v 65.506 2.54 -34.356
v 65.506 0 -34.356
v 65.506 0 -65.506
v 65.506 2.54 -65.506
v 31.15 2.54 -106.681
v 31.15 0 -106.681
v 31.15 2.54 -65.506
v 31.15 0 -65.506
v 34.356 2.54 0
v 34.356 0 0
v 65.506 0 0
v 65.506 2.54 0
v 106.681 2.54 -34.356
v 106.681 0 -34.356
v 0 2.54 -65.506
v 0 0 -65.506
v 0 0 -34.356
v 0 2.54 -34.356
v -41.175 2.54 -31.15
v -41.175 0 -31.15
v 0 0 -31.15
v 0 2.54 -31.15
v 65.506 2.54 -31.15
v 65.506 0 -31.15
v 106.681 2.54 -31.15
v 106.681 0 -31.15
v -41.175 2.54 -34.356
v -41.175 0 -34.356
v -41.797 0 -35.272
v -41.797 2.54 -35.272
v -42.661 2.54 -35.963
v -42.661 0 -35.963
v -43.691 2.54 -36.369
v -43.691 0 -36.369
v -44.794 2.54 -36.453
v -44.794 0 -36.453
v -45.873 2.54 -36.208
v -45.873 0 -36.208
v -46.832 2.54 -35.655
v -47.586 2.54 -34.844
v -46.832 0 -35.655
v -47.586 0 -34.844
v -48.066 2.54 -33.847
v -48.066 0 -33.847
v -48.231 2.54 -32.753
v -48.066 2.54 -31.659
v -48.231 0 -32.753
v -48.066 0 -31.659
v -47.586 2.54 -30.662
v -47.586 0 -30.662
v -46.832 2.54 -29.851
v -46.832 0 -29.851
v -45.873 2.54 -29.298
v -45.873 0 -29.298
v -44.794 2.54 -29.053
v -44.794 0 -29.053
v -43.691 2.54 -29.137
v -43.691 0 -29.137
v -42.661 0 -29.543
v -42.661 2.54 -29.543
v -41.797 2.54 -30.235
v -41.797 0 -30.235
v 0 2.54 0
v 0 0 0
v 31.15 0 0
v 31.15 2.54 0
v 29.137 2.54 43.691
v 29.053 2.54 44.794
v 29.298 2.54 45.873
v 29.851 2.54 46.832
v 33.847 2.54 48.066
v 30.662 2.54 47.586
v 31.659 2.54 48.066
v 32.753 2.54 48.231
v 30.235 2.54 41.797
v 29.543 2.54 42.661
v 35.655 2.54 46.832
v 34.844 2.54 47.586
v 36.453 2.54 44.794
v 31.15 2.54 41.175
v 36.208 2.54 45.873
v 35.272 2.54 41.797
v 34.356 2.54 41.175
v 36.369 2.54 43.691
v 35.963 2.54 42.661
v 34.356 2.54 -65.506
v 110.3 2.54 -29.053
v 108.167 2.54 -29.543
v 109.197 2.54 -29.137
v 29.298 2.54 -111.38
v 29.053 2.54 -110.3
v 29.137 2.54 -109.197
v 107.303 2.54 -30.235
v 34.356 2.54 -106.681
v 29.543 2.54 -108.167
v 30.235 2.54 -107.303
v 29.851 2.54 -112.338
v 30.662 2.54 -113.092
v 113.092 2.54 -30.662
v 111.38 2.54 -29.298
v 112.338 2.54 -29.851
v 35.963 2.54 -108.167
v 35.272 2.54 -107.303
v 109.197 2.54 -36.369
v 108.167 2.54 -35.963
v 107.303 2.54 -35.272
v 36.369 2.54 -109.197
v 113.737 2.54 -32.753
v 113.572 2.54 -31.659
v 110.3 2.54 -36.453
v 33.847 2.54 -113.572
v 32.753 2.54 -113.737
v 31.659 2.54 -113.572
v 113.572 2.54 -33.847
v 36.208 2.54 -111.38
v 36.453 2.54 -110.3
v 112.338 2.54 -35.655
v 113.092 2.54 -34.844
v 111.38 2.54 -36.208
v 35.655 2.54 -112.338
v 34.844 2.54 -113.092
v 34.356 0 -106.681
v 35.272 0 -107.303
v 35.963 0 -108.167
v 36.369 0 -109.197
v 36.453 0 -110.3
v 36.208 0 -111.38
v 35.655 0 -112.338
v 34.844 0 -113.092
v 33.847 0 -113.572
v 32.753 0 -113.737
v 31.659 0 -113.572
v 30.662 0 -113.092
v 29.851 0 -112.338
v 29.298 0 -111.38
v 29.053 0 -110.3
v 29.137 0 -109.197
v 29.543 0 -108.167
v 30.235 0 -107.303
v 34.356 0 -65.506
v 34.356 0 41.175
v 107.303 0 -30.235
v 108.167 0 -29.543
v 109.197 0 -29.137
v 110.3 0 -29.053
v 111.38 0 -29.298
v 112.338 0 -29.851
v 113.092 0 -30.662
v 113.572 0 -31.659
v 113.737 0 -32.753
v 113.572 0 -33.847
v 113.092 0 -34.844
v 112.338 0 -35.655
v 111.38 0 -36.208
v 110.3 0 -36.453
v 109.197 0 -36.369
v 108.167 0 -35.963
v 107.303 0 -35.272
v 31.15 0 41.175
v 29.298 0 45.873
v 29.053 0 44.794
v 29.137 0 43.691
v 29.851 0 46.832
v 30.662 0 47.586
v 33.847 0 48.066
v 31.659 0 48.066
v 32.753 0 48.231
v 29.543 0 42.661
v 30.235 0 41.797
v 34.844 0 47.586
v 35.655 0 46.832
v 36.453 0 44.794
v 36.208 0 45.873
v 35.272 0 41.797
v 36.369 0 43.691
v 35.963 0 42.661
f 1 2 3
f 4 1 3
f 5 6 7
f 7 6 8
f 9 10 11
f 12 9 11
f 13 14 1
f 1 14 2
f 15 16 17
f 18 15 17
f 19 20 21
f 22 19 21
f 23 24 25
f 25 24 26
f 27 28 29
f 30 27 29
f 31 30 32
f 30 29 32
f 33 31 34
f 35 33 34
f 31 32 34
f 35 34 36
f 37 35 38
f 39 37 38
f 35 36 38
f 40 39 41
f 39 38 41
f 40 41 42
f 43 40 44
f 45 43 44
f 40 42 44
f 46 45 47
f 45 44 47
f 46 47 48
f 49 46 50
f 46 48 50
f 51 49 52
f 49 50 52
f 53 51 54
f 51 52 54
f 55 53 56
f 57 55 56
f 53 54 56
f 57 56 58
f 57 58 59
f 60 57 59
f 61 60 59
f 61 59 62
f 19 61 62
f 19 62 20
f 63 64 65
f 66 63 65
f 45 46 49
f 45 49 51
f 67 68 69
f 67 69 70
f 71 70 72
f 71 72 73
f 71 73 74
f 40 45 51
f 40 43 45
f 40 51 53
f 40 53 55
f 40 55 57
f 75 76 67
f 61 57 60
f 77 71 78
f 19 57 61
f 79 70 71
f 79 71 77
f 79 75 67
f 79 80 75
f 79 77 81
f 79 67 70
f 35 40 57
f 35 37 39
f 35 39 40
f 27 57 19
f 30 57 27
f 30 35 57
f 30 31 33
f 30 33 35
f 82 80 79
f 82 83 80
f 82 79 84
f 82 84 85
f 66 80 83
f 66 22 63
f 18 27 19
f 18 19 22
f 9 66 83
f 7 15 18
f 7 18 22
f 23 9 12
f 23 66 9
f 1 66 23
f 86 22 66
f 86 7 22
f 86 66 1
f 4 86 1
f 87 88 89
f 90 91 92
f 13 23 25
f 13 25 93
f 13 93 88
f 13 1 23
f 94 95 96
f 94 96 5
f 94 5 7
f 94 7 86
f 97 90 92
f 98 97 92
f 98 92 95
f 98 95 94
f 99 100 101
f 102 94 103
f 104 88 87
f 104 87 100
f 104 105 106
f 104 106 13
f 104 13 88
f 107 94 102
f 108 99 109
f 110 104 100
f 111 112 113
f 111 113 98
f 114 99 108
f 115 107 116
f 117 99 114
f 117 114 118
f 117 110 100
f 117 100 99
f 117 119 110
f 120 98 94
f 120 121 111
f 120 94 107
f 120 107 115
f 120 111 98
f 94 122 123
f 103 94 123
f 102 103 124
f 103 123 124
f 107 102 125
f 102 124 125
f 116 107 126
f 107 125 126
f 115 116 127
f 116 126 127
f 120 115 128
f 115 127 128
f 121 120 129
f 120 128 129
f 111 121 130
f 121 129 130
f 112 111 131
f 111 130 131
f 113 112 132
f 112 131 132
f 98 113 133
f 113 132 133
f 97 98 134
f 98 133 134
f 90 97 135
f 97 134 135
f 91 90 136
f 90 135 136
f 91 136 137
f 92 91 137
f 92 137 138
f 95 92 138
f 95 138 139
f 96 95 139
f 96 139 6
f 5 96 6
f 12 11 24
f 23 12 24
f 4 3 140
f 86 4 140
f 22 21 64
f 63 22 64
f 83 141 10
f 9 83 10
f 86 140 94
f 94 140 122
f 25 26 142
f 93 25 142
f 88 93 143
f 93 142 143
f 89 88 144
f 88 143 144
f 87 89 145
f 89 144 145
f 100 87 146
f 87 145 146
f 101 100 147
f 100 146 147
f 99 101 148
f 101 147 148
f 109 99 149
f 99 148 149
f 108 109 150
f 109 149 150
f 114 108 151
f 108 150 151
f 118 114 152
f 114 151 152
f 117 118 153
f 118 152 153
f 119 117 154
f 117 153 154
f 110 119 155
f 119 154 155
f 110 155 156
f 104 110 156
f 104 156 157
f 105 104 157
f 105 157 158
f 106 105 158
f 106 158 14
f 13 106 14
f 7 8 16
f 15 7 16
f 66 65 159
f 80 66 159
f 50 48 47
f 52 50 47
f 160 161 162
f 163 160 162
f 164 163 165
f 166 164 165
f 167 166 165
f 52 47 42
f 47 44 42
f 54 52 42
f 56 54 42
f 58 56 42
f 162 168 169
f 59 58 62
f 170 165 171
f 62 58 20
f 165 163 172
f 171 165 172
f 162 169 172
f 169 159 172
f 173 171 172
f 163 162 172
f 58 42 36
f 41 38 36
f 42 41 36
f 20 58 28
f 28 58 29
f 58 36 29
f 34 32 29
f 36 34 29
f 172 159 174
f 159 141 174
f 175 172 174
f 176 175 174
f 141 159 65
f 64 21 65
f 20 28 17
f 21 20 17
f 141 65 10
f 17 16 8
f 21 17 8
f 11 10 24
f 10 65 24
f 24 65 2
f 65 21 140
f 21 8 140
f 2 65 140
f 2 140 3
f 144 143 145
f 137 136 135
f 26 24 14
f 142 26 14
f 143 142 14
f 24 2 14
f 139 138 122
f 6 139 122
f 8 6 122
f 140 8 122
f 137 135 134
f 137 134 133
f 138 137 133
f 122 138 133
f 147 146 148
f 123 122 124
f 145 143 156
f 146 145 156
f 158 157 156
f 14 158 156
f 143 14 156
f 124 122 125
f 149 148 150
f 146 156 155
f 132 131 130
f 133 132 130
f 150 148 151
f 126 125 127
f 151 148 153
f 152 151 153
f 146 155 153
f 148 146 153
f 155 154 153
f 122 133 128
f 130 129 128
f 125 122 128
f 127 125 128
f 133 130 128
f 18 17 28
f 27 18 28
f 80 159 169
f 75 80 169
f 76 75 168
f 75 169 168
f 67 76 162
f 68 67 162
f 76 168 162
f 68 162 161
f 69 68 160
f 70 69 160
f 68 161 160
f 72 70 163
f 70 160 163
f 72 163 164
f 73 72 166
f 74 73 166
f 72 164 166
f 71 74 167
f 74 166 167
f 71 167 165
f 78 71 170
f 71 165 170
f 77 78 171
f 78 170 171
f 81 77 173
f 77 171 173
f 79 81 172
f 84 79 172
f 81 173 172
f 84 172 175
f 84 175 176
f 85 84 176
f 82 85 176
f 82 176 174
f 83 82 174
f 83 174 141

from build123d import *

# Parameters (mm, degrees)
BOSS_EXTRUDE1_DEPTH = 2.54


with BuildPart() as part:
    # Sketch1 → Boss-Extrude1 (new body)
    with BuildSketch(Plane(origin=(0, 0, 0), x_dir=(1, 0, 0), z_dir=(0, 1, 0))):
        with BuildLine():
            Line((34.356030095, 0), (65.506126721, 0))
            Line((65.506126721, 0), (65.506126721, 31.150096626))
            Line((65.506126721, 31.150096626), (106.681389714, 31.150096626))
            ThreePointArc((106.681389714, 31.150096626), (113.737222592, 32.753063361), (106.681389714, 34.356030095))
            Line((106.681389714, 34.356030095), (65.506126721, 34.356030095))
            Line((65.506126721, 34.356030095), (65.506126721, 65.506126721))
            Line((65.506126721, 65.506126721), (34.356030095, 65.506126721))
            Line((34.356030095, 65.506126721), (34.356030095, 106.681389714))
            ThreePointArc((34.356030095, 106.681389714), (32.753063361, 113.737222592), (31.150096626, 106.681389714))
            Line((31.150096626, 106.681389714), (31.150096626, 65.506126721))
            Line((31.150096626, 65.506126721), (0, 65.506126721))
            Line((0, 65.506126721), (0, 34.356030095))
            Line((0, 34.356030095), (-41.175262993, 34.356030095))
            ThreePointArc((-41.175262993, 34.356030095), (-48.231095871, 32.753063361), (-41.175262993, 31.150096626))
            Line((-41.175262993, 31.150096626), (0, 31.150096626))
            Line((0, 31.150096626), (0, 0))
            Line((0, 0), (31.150096626, 0))
            Line((31.150096626, 0), (31.150096626, -41.175262993))
            ThreePointArc((31.150096626, -41.175262993), (32.753063361, -48.231095871), (34.356030095, -41.175262993))
            Line((34.356030095, -41.175262993), (34.356030095, 0))
        make_face()
    extrude(amount=BOSS_EXTRUDE1_DEPTH)


solid = part.part
